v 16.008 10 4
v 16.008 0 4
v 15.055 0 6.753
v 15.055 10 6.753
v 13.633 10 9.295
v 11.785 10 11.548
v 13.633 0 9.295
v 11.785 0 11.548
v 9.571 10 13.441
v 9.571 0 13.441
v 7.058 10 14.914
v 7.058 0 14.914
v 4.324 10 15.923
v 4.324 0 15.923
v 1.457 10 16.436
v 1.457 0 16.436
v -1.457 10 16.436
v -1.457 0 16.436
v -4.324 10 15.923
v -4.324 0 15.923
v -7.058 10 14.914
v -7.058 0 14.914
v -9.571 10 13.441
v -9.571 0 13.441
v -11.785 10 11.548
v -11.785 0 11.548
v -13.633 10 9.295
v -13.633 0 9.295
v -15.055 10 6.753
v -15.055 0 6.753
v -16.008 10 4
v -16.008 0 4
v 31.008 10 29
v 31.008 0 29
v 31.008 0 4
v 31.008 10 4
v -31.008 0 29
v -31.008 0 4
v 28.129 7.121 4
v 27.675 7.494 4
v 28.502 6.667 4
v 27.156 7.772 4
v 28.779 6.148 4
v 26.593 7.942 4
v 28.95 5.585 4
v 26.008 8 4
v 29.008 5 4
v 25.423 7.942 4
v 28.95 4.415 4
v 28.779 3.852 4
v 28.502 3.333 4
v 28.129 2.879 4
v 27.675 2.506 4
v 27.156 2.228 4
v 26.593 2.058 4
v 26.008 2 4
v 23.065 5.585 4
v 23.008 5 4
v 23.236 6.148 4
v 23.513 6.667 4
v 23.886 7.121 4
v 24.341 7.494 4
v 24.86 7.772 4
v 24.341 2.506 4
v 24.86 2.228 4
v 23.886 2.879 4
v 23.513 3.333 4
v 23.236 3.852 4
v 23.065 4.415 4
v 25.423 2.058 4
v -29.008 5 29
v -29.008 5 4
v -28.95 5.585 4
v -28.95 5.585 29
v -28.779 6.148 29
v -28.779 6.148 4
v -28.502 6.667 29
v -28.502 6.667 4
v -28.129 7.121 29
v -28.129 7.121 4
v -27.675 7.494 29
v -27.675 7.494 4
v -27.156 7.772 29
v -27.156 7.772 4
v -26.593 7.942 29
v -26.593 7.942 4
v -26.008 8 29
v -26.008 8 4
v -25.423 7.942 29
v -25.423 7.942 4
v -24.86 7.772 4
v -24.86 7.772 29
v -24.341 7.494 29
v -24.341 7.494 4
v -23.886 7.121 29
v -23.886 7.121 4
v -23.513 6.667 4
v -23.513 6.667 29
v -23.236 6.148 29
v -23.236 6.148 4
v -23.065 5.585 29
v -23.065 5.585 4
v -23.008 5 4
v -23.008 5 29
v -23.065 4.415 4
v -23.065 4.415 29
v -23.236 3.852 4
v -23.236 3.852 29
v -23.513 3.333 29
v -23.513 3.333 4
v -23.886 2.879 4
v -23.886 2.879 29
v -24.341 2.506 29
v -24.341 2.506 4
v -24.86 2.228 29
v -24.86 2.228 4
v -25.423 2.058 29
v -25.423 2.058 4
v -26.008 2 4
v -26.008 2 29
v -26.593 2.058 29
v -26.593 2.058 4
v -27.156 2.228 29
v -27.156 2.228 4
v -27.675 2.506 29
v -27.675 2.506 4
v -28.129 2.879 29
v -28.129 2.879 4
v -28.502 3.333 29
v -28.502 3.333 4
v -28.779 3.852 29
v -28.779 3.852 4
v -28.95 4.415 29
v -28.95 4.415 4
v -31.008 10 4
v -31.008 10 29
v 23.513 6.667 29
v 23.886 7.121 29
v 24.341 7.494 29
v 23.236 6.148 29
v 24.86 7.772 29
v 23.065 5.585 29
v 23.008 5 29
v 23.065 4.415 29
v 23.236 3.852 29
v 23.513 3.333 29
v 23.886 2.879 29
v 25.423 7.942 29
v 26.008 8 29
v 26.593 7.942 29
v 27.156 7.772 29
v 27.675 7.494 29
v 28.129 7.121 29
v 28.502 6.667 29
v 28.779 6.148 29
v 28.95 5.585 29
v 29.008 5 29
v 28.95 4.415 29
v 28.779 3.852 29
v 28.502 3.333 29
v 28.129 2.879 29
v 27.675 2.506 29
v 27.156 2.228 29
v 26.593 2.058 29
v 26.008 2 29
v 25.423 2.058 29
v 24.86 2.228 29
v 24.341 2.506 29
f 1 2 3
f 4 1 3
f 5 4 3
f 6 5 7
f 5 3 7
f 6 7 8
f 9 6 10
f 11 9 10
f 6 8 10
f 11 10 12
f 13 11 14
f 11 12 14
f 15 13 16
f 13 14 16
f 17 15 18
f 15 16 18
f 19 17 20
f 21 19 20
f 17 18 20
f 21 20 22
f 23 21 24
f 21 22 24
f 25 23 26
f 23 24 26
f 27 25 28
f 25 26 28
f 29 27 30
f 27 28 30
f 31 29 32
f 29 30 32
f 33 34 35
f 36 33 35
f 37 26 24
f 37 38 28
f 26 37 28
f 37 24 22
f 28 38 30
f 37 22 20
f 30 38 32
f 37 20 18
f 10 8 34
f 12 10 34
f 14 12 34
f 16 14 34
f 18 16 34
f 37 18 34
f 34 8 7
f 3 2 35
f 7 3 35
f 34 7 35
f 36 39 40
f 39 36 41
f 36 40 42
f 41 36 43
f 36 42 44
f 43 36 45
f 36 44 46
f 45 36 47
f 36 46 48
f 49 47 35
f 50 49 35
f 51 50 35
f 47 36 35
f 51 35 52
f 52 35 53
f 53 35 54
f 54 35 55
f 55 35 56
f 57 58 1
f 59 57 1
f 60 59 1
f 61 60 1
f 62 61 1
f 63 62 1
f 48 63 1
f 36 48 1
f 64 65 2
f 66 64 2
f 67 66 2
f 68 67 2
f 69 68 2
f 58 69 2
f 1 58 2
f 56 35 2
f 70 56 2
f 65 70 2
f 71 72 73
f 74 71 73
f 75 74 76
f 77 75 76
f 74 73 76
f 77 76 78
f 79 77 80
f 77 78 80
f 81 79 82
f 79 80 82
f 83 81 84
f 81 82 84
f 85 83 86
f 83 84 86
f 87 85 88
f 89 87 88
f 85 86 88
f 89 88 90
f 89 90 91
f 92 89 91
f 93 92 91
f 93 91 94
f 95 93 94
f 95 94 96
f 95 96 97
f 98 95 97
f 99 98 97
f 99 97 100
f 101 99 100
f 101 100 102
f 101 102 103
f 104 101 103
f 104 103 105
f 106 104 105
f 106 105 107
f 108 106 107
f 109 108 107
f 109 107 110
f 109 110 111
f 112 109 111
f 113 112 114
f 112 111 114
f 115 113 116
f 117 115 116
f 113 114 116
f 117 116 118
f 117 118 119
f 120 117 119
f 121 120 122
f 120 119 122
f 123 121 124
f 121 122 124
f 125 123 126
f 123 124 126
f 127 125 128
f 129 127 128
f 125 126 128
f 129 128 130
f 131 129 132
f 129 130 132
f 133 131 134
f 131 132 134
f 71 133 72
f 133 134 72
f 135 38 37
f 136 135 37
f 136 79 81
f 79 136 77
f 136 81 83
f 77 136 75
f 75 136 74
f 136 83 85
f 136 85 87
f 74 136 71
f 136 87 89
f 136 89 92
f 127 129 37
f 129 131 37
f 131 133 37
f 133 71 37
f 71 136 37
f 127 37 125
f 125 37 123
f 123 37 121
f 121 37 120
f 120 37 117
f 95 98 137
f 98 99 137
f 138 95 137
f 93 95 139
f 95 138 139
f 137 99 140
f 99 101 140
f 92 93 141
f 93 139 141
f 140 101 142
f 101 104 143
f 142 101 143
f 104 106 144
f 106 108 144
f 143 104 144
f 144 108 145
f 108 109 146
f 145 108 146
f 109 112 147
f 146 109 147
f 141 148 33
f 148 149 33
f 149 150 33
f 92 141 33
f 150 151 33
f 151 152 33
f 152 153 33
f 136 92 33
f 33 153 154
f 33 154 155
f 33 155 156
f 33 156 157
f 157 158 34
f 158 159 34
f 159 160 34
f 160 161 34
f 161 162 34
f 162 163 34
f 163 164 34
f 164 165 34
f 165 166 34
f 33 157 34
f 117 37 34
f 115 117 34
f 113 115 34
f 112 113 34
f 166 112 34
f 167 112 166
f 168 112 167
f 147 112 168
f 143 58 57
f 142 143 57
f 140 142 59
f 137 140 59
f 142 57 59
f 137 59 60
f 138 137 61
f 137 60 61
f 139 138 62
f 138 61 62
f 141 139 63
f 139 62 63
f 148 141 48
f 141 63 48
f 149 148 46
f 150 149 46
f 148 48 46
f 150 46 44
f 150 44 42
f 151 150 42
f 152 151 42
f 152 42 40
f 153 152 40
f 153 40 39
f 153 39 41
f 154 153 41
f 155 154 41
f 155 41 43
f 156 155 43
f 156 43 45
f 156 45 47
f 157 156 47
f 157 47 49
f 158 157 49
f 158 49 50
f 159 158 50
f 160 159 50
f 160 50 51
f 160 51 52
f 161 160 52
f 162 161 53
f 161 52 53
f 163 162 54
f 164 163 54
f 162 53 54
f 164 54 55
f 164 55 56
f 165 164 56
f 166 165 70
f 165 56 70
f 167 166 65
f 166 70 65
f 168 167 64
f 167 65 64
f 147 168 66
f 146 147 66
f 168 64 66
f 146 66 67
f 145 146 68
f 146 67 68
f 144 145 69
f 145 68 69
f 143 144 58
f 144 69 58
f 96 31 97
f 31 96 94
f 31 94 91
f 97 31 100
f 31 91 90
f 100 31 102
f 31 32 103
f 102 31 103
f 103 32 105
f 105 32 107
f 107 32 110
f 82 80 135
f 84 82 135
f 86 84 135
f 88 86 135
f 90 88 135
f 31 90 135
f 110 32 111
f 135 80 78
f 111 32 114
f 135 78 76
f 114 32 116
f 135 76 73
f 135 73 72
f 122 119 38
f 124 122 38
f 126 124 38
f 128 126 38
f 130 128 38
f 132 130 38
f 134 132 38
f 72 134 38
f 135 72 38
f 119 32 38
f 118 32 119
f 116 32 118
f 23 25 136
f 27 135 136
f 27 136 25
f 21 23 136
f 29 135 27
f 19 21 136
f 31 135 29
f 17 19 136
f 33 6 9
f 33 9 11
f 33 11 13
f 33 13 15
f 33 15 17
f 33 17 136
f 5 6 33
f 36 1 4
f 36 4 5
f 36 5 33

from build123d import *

# Parameters (mm, degrees)
BOSS_EXTRUDE1_DEPTH = 10
SKETCH2_R           = 3
CUT_EXTRUDE1_DEPTH  = 27


with BuildPart() as part:
    # Sketch1 → Boss-Extrude1 (new body)
    with BuildSketch(Plane(origin=(0, 0, 0), x_dir=(1, 0, 0), z_dir=(0, 1, 0))):
        with BuildLine():
            Line((-16.007810594, -4), (-31.007810594, -4))
            Line((-31.007810594, -4), (-31.007810594, -29))
            Line((-31.007810594, -29), (-22, -29))
            Line((-22, -29), (22, -29))
            Line((22, -29), (31.007810594, -29))
            Line((31.007810594, -29), (31.007810594, -4))
            Line((31.007810594, -4), (16.007810594, -4))
            ThreePointArc((16.007810594, -4), (0, -16.5), (-16.007810594, -4))
        make_face()
    extrude(amount=BOSS_EXTRUDE1_DEPTH)

    # Sketch2 → Cut-Extrude1 (cut)
    with BuildSketch(Plane(origin=(0, 0, 4), x_dir=(-1, 0, 0), z_dir=(0, 0, -1))):
        with Locations((-26.007810594, 5)):
            Circle(SKETCH2_R)
        with Locations((26.007810594, 5)):
            Circle(SKETCH2_R)
    extrude(amount=-CUT_EXTRUDE1_DEPTH, mode=Mode.SUBTRACT)


solid = part.part
